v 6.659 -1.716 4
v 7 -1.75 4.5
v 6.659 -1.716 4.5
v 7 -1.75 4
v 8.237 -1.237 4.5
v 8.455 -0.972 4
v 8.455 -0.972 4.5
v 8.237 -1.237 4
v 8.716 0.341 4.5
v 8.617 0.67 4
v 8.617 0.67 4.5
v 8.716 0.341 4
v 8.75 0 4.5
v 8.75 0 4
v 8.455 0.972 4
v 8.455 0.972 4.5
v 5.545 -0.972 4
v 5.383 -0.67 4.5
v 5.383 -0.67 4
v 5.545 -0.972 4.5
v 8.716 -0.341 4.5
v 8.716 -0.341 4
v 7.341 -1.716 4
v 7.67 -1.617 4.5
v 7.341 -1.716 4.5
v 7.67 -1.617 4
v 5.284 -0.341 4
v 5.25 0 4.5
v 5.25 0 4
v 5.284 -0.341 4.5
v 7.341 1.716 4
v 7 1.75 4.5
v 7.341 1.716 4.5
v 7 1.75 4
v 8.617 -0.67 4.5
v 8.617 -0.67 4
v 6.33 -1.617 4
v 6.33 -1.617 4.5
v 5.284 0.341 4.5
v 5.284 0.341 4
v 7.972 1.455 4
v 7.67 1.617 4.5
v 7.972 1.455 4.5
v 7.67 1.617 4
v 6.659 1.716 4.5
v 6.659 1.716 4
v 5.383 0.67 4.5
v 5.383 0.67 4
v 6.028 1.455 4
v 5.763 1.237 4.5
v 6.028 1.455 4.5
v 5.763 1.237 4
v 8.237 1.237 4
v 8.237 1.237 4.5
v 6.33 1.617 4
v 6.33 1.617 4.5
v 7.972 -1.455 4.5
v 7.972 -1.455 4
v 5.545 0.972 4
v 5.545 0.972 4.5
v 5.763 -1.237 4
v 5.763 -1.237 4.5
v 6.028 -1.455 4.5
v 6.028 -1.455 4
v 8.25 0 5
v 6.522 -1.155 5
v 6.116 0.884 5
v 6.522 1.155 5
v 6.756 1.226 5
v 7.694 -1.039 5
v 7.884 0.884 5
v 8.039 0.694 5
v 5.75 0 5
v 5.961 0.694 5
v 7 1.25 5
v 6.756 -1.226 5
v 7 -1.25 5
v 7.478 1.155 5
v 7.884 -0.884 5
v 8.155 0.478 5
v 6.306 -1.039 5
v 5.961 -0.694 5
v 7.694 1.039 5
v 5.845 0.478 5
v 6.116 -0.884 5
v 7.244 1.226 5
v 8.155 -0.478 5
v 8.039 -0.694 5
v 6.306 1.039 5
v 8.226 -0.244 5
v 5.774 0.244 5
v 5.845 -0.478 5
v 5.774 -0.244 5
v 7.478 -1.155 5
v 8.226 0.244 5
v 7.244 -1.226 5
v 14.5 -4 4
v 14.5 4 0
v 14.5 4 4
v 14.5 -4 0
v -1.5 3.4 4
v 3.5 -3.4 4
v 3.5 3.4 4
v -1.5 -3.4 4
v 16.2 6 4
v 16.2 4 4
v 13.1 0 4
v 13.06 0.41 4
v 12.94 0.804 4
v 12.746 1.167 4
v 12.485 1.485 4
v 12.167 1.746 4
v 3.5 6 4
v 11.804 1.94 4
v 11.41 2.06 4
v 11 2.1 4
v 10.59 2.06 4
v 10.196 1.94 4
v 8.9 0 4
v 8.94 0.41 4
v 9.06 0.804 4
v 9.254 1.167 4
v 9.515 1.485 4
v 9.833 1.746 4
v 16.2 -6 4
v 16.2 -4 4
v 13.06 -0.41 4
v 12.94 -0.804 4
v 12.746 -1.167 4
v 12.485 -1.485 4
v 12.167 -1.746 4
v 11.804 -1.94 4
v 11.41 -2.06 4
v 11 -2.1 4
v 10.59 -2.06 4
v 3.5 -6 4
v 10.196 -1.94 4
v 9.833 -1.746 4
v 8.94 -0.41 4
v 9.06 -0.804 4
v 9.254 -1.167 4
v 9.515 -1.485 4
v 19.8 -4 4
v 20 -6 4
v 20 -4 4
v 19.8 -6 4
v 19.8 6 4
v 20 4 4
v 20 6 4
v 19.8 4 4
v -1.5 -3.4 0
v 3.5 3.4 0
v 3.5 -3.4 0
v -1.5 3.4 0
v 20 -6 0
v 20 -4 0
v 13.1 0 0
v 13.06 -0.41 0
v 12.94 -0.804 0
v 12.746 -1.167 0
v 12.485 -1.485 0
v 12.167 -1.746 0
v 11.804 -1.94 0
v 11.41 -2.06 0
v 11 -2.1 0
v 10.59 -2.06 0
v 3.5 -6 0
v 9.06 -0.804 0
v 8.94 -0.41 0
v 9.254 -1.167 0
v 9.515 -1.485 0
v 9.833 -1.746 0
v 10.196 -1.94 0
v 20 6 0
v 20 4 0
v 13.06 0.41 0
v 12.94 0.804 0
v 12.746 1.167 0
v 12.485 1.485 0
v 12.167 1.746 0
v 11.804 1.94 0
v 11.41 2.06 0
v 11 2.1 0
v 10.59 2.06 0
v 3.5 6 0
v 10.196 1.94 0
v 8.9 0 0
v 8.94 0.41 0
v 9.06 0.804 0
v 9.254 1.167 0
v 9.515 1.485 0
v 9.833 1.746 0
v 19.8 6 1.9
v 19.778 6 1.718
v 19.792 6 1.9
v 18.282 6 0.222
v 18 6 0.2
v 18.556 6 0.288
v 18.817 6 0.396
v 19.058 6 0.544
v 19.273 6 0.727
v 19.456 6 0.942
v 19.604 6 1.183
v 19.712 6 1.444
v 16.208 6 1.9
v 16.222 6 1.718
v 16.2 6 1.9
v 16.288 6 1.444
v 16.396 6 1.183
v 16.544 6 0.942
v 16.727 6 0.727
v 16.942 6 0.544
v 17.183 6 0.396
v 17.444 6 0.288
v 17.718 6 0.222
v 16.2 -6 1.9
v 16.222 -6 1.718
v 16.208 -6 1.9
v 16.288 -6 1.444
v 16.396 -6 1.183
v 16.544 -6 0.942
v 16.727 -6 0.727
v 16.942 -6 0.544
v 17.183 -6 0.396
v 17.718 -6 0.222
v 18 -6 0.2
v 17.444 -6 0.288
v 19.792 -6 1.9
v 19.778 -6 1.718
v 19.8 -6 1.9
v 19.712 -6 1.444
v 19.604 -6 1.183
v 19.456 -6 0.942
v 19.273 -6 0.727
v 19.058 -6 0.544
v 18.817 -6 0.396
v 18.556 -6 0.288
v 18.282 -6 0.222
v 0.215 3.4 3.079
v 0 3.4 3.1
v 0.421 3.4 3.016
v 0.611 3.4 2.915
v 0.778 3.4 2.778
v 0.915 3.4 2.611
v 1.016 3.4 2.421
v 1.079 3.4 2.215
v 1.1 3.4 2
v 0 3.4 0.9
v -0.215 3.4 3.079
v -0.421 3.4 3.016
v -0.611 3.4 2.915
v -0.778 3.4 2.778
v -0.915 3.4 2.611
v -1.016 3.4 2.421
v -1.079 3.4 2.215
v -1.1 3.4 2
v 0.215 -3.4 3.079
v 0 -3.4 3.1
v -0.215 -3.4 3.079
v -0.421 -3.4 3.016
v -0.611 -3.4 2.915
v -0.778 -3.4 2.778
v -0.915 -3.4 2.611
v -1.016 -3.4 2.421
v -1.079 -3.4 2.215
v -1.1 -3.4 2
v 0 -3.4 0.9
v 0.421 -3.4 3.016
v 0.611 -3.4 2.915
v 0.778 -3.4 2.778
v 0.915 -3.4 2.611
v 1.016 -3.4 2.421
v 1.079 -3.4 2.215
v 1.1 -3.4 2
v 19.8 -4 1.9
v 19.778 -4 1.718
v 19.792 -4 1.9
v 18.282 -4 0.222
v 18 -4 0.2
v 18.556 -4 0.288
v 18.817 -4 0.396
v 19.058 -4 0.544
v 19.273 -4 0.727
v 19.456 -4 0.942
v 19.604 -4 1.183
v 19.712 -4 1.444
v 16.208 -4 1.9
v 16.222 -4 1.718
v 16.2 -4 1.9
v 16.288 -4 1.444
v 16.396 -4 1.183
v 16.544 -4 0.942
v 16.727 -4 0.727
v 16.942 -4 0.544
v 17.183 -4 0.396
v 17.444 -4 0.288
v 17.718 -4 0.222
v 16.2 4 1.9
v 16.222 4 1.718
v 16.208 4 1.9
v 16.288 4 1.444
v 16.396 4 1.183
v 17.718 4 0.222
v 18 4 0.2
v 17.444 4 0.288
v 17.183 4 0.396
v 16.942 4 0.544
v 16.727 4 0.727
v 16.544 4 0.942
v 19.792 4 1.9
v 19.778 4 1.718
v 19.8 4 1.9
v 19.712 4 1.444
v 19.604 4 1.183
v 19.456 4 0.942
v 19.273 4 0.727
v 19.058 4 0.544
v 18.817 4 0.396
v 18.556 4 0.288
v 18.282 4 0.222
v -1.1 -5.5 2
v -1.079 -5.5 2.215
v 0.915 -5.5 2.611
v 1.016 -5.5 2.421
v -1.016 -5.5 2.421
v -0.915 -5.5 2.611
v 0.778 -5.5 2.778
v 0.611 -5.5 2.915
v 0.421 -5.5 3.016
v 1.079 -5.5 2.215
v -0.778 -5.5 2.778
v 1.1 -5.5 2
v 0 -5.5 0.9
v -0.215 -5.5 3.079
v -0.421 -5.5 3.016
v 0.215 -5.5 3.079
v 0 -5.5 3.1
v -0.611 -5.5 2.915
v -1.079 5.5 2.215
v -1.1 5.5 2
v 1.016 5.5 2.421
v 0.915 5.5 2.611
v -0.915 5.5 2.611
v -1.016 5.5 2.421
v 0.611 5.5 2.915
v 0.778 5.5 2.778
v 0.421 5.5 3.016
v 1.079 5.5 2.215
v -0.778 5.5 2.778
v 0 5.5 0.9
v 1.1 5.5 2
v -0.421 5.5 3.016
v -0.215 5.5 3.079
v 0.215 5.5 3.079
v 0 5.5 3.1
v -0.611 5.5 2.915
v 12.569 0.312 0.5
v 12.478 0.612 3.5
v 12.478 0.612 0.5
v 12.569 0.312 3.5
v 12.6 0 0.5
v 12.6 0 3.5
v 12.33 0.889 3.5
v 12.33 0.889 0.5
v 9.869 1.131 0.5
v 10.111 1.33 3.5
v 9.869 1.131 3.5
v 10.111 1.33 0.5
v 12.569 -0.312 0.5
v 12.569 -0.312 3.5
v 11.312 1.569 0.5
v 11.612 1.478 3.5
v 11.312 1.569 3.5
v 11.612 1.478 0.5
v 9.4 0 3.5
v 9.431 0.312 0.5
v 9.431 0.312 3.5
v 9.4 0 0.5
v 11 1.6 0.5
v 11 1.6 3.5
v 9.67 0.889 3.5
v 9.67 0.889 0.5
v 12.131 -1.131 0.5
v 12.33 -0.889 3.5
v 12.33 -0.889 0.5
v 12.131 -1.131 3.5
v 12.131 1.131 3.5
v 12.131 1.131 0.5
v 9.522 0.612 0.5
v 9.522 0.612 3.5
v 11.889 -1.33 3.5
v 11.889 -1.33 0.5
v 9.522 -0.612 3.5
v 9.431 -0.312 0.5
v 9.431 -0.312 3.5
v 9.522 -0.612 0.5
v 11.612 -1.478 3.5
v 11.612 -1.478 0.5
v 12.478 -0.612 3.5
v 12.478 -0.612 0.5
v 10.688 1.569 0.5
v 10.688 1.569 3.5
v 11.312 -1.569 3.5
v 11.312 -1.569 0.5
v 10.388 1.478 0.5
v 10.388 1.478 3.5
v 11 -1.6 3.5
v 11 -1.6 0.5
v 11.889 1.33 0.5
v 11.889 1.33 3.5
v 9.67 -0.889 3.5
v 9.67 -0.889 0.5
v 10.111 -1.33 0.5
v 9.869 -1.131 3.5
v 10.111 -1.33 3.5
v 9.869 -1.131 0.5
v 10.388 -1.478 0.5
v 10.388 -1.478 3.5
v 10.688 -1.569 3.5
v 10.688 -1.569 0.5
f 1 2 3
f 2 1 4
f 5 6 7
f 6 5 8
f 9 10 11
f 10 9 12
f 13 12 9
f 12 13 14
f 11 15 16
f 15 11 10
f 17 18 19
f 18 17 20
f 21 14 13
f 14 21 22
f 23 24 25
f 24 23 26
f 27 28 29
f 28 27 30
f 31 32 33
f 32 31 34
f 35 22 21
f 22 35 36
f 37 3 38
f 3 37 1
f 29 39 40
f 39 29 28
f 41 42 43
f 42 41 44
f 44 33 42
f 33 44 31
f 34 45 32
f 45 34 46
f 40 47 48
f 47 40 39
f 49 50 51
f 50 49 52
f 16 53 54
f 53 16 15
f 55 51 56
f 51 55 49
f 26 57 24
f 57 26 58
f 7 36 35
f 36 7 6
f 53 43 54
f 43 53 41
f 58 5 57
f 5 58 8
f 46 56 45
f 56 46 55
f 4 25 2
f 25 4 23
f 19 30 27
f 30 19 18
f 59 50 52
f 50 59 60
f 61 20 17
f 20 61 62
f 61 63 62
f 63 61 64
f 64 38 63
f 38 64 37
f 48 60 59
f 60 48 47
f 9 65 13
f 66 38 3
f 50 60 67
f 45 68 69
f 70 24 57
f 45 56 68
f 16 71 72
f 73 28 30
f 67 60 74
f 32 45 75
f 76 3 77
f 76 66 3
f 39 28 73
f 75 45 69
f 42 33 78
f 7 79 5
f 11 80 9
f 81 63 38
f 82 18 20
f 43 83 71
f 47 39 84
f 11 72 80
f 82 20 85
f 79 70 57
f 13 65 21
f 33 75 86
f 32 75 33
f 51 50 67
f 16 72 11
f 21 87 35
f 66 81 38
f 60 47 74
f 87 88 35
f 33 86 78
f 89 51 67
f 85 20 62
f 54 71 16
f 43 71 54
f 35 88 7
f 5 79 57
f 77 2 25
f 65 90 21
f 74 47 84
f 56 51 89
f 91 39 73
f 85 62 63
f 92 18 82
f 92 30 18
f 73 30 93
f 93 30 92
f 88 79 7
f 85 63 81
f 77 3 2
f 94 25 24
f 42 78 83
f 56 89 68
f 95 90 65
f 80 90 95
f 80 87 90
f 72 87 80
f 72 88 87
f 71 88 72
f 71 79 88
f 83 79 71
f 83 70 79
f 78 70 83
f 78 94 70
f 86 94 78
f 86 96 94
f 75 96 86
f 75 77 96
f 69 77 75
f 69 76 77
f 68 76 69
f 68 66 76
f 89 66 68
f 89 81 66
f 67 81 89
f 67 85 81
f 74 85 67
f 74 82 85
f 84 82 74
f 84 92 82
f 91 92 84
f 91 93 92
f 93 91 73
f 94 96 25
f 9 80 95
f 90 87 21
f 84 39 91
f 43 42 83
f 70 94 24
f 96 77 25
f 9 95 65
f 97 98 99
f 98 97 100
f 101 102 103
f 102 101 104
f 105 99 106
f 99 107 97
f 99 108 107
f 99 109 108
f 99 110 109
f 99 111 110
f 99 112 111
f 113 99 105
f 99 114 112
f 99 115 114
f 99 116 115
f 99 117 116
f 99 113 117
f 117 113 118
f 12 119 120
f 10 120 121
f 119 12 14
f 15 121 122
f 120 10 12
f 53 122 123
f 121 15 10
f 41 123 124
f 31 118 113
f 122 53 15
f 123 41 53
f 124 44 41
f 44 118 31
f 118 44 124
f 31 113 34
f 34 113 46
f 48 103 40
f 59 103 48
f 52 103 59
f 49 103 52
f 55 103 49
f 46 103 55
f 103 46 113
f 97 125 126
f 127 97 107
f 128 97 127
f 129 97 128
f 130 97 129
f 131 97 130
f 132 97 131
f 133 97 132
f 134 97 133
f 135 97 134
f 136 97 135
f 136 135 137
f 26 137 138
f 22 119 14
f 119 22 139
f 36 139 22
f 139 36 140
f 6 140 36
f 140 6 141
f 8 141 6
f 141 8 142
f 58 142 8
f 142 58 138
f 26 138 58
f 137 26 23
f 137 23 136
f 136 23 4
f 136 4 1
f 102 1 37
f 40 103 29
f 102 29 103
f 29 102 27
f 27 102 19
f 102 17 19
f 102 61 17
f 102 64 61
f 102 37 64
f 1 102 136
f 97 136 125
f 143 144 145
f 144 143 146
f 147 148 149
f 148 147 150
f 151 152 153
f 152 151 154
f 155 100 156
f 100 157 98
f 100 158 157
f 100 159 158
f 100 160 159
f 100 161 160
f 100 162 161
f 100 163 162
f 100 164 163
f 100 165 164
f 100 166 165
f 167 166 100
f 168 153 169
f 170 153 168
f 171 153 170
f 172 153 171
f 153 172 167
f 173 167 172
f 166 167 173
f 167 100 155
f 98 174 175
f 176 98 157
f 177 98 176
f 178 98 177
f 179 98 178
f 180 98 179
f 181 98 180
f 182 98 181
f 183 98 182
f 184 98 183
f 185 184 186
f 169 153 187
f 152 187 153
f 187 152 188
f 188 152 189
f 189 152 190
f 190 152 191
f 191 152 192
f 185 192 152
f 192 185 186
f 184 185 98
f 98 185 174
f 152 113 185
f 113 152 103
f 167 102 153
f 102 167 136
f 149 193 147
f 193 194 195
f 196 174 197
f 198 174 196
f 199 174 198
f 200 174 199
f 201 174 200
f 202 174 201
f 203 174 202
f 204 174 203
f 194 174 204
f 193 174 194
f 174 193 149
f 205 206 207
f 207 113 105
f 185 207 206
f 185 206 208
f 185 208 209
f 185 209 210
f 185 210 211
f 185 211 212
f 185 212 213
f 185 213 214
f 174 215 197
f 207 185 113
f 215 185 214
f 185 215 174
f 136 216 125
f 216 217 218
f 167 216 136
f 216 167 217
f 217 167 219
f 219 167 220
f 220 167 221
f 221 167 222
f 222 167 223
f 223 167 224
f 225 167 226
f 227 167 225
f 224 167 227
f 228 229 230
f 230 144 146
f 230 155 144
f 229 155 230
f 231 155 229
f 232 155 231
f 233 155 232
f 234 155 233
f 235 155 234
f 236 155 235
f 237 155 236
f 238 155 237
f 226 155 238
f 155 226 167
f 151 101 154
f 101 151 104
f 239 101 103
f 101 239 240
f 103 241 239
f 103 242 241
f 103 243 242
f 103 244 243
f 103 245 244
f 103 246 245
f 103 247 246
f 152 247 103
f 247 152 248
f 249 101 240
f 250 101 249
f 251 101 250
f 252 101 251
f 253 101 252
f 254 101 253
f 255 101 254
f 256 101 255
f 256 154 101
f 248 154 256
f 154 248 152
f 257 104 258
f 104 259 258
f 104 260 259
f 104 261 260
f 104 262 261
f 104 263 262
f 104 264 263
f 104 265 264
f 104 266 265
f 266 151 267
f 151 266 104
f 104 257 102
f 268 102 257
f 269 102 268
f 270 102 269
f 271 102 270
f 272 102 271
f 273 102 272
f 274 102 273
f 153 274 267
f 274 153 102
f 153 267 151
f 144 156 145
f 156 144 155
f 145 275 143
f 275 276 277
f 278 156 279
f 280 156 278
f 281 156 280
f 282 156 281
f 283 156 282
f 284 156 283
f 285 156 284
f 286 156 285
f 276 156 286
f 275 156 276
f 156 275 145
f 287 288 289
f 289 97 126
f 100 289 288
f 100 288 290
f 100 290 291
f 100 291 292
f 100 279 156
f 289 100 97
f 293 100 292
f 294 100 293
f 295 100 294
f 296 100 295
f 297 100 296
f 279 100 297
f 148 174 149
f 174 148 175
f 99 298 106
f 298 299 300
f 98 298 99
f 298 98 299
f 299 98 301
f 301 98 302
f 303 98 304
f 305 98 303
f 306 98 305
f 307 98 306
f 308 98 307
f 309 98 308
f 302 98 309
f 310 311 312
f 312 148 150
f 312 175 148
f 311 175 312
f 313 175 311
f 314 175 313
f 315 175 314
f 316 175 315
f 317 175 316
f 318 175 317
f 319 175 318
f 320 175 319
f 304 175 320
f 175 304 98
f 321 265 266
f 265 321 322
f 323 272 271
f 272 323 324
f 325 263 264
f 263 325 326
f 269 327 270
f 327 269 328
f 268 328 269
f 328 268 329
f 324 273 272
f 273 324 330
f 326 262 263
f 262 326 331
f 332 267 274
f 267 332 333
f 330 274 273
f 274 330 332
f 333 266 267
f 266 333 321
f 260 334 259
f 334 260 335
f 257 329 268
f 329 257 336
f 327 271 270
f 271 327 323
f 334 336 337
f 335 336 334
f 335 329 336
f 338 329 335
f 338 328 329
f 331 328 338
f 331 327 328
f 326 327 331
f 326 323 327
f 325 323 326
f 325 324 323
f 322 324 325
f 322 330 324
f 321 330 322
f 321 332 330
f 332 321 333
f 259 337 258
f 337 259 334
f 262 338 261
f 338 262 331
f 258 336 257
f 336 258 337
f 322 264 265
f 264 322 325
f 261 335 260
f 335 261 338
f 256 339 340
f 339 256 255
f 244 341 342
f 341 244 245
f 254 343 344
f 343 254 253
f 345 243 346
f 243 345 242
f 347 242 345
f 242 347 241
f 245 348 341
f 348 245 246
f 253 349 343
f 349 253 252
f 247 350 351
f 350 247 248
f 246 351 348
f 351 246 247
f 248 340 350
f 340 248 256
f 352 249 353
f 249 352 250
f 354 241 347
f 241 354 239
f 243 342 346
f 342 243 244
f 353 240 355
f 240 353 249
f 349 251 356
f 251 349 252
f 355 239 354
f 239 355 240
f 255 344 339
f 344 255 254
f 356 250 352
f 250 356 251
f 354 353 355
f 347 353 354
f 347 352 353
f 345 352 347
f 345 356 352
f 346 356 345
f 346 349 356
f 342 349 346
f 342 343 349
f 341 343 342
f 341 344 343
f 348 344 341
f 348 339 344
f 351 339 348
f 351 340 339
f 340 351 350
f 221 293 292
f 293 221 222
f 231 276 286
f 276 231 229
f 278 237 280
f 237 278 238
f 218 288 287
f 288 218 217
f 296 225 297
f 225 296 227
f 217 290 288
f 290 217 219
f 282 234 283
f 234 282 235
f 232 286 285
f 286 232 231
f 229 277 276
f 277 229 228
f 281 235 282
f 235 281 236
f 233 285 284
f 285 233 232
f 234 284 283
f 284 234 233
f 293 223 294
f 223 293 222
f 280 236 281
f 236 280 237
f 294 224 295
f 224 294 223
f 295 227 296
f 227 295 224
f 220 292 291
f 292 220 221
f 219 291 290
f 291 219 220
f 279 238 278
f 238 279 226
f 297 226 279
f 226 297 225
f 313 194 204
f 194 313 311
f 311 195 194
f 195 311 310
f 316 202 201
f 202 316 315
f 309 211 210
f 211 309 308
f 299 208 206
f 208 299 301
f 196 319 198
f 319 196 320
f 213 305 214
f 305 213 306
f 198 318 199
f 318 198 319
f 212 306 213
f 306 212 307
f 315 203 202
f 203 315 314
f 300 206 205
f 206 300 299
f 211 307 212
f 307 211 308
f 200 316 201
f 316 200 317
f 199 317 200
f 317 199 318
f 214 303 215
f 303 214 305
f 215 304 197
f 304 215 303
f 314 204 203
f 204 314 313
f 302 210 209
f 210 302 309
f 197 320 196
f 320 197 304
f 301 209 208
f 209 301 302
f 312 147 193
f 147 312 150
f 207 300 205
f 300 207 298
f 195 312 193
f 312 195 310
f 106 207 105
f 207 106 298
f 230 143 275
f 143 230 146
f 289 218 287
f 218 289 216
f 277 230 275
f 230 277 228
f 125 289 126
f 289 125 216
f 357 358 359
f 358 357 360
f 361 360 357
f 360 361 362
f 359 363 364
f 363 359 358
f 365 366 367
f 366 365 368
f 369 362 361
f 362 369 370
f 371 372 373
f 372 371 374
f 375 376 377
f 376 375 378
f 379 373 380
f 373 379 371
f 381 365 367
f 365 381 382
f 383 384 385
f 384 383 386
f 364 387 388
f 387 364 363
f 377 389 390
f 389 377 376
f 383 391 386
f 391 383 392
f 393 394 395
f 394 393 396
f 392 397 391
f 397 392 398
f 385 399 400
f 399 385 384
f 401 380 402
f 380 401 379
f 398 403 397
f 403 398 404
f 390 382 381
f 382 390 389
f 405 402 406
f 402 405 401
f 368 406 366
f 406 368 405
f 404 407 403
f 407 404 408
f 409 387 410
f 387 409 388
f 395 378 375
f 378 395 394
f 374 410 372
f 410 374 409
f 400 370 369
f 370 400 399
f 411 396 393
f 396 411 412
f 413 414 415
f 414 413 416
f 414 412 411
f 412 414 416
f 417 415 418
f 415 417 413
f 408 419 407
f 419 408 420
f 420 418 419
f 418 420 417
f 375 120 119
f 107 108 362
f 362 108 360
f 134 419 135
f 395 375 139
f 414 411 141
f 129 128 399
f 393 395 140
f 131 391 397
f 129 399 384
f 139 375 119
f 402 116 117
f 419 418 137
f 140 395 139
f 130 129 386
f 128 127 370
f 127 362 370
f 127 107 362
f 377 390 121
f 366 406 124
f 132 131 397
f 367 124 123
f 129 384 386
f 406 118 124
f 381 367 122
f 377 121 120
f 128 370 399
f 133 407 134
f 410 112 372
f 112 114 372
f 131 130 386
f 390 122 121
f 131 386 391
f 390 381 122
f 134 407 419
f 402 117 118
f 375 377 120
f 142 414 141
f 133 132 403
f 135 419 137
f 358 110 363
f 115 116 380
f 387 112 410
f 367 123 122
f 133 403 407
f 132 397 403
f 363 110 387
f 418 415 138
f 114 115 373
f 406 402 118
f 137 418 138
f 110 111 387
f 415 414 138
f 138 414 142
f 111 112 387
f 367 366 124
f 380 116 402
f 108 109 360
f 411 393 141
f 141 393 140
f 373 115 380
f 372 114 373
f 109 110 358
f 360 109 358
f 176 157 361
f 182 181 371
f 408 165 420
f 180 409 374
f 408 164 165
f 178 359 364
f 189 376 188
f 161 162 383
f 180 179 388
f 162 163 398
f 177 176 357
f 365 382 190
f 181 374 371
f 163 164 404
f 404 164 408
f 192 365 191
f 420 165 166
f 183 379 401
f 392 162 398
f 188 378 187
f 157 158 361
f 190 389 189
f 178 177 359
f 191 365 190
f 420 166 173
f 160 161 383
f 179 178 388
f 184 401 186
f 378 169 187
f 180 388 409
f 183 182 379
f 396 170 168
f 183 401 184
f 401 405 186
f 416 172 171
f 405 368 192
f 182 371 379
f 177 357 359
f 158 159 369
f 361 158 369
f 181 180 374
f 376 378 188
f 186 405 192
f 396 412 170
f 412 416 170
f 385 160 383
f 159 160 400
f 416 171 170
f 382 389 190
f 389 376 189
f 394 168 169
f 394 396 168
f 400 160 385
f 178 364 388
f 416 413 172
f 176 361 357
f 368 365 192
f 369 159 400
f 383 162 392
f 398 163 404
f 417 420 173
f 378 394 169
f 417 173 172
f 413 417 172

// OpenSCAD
// Bracelet of hinged links, printed in place (3-link sample of a 10-link chain)
part = "link"; // [link, assembly]
cadverify_only = "";
module instance(name, part, unit = 1) {
    echo(cadverify_instance = [name, part, unit]);
    if (cadverify_only == "" || cadverify_only == name) children();
}
// link: pitch 18 (X), width 12 (Y), body 4 thick + 1 snap stud = 5
// hinge: teardrop pin (r1.1) in U-cradle (r1.8, open at top), 0.7 radial, 0.6 side clearance
P = 18; W = 12; Zc = 2.0;
Rp = 1.1; Rh = 1.8; SlotH = 1.8;
Ytong = 3.4;
Xrear = -1.5; Xsr = 3.5; Xsf = 14.5; Xlr = 13.5; Xfront = 20;
XpinF = 18;
studX = 7; studR = 1.75;
holeX = 11; holeR = 1.6;
module teardrop2D() {
    pts = concat([for (a=[0:180/16:180]) [Rp*cos(a), Zc+Rp*sin(a)]], [[0, Zc-Rp]]);
    polygon(pts);
}
module pin_stub(len) { linear_extrude(height=len) teardrop2D(); }
module stud_solid() {
    translate([studX, 0, 3.9]) cylinder(r=studR, h=0.6, $fn=32);
    translate([studX, 0, 4.5]) cylinder(r1=studR, r2=1.25, h=0.5, $fn=32);
}
module link() {
    difference() {
        union() {
            translate([Xsr, -6, 0]) cube([Xsf-Xsr, 12, 4]);
            translate([Xrear, -Ytong, 0]) cube([(4.5-Xrear), 2*Ytong, 4]);
            translate([Xlr, -6, 0]) cube([Xfront-Xlr, 2, 4]);
            translate([Xlr, 4, 0]) cube([Xfront-Xlr, 2, 4]);
            translate([0, -2.5, 0]) rotate([90,0,0]) pin_stub(3.0);
            translate([0, 5.5, 0]) rotate([90,0,0]) pin_stub(3.0);
            stud_solid();
        }
        translate([XpinF, -6.1, Zc]) rotate([-90,0,0]) cylinder(r=Rh, h=2.2, $fn=40);
        translate([XpinF, 3.9, Zc]) rotate([-90,0,0]) cylinder(r=Rh, h=2.2, $fn=40);
        translate([XpinF-SlotH, 3.9, 1.9]) cube([2*SlotH, 2.2, 2.2]);
        translate([XpinF-SlotH, -6.1, 1.9]) cube([2*SlotH, 2.2, 2.2]);
        translate([holeX, 0, -0.1]) cylinder(r=holeR, h=4.2, $fn=32);
        translate([holeX, 0, 3.5]) cylinder(r1=holeR, r2=2.1, h=0.5, $fn=32);
        translate([holeX, 0, 0]) cylinder(r1=2.1, r2=holeR, h=0.5, $fn=32);
    }
}
if (part == "assembly") {
    echo(cadverify_spec = [
        ["bounds", [[-1.5, -6, 0], [56, 6, 5]]],
        ["support_faces", [["bed", "-z", 300]]],
        ["allowed_interferences", []],
        ["motions", [["joint_bend", ["link3"], "rotate", [36, 0, 2], [0, 1, 0], [-30, 30]]]],
        ["assembly_order", [[["link1"], [0, 0, 0]], [["link2"], [0, 0, -1]], [["link3"], [0, 0, -1]]]],
        ["print_in_place", 0.5],
        ["overhangs_allowed", []]
    ]);
    instance("link1", "link", 1) translate([0, 0, 0]) link();
    instance("link2", "link", 1) translate([18, 0, 0]) link();
    instance("link3", "link", 1) translate([36, 0, 0]) link();
} else {
    echo(cadverify_spec = [
        ["bounds", [[-1.5, -6, 0], [20, 6, 5]]],
        ["bodies", 1],
        ["through_holes", 1],
        ["support_faces", [["bed", "-z", 100]]],
        ["overhangs_allowed", []],
        ["copies", 3],
        ["details", [
            ["spine", "material", [[5, -5, 0], [9, 5, 4]], 0.9],
            ["slot", "void", [[14.5, -4, 0], [20, 4, 4]], 0.9],
            ["cradle", "void", [[16.2, 4, 1.9], [19.8, 6.1, 4.1]], 0.9],
            ["snap_hole", "hole", [11, 0, 6], [0, 0, -1], [[0, 4.2], [0.5, 3.2], [3.5, 3.2]]],
            ["floor", "thickness", [9, 3, -1], [0, 0, 1], 4],
            ["snap", "view", [[5, -2, 4], [9, 2, 5]]]
        ]]
    ]);
    link();
}
